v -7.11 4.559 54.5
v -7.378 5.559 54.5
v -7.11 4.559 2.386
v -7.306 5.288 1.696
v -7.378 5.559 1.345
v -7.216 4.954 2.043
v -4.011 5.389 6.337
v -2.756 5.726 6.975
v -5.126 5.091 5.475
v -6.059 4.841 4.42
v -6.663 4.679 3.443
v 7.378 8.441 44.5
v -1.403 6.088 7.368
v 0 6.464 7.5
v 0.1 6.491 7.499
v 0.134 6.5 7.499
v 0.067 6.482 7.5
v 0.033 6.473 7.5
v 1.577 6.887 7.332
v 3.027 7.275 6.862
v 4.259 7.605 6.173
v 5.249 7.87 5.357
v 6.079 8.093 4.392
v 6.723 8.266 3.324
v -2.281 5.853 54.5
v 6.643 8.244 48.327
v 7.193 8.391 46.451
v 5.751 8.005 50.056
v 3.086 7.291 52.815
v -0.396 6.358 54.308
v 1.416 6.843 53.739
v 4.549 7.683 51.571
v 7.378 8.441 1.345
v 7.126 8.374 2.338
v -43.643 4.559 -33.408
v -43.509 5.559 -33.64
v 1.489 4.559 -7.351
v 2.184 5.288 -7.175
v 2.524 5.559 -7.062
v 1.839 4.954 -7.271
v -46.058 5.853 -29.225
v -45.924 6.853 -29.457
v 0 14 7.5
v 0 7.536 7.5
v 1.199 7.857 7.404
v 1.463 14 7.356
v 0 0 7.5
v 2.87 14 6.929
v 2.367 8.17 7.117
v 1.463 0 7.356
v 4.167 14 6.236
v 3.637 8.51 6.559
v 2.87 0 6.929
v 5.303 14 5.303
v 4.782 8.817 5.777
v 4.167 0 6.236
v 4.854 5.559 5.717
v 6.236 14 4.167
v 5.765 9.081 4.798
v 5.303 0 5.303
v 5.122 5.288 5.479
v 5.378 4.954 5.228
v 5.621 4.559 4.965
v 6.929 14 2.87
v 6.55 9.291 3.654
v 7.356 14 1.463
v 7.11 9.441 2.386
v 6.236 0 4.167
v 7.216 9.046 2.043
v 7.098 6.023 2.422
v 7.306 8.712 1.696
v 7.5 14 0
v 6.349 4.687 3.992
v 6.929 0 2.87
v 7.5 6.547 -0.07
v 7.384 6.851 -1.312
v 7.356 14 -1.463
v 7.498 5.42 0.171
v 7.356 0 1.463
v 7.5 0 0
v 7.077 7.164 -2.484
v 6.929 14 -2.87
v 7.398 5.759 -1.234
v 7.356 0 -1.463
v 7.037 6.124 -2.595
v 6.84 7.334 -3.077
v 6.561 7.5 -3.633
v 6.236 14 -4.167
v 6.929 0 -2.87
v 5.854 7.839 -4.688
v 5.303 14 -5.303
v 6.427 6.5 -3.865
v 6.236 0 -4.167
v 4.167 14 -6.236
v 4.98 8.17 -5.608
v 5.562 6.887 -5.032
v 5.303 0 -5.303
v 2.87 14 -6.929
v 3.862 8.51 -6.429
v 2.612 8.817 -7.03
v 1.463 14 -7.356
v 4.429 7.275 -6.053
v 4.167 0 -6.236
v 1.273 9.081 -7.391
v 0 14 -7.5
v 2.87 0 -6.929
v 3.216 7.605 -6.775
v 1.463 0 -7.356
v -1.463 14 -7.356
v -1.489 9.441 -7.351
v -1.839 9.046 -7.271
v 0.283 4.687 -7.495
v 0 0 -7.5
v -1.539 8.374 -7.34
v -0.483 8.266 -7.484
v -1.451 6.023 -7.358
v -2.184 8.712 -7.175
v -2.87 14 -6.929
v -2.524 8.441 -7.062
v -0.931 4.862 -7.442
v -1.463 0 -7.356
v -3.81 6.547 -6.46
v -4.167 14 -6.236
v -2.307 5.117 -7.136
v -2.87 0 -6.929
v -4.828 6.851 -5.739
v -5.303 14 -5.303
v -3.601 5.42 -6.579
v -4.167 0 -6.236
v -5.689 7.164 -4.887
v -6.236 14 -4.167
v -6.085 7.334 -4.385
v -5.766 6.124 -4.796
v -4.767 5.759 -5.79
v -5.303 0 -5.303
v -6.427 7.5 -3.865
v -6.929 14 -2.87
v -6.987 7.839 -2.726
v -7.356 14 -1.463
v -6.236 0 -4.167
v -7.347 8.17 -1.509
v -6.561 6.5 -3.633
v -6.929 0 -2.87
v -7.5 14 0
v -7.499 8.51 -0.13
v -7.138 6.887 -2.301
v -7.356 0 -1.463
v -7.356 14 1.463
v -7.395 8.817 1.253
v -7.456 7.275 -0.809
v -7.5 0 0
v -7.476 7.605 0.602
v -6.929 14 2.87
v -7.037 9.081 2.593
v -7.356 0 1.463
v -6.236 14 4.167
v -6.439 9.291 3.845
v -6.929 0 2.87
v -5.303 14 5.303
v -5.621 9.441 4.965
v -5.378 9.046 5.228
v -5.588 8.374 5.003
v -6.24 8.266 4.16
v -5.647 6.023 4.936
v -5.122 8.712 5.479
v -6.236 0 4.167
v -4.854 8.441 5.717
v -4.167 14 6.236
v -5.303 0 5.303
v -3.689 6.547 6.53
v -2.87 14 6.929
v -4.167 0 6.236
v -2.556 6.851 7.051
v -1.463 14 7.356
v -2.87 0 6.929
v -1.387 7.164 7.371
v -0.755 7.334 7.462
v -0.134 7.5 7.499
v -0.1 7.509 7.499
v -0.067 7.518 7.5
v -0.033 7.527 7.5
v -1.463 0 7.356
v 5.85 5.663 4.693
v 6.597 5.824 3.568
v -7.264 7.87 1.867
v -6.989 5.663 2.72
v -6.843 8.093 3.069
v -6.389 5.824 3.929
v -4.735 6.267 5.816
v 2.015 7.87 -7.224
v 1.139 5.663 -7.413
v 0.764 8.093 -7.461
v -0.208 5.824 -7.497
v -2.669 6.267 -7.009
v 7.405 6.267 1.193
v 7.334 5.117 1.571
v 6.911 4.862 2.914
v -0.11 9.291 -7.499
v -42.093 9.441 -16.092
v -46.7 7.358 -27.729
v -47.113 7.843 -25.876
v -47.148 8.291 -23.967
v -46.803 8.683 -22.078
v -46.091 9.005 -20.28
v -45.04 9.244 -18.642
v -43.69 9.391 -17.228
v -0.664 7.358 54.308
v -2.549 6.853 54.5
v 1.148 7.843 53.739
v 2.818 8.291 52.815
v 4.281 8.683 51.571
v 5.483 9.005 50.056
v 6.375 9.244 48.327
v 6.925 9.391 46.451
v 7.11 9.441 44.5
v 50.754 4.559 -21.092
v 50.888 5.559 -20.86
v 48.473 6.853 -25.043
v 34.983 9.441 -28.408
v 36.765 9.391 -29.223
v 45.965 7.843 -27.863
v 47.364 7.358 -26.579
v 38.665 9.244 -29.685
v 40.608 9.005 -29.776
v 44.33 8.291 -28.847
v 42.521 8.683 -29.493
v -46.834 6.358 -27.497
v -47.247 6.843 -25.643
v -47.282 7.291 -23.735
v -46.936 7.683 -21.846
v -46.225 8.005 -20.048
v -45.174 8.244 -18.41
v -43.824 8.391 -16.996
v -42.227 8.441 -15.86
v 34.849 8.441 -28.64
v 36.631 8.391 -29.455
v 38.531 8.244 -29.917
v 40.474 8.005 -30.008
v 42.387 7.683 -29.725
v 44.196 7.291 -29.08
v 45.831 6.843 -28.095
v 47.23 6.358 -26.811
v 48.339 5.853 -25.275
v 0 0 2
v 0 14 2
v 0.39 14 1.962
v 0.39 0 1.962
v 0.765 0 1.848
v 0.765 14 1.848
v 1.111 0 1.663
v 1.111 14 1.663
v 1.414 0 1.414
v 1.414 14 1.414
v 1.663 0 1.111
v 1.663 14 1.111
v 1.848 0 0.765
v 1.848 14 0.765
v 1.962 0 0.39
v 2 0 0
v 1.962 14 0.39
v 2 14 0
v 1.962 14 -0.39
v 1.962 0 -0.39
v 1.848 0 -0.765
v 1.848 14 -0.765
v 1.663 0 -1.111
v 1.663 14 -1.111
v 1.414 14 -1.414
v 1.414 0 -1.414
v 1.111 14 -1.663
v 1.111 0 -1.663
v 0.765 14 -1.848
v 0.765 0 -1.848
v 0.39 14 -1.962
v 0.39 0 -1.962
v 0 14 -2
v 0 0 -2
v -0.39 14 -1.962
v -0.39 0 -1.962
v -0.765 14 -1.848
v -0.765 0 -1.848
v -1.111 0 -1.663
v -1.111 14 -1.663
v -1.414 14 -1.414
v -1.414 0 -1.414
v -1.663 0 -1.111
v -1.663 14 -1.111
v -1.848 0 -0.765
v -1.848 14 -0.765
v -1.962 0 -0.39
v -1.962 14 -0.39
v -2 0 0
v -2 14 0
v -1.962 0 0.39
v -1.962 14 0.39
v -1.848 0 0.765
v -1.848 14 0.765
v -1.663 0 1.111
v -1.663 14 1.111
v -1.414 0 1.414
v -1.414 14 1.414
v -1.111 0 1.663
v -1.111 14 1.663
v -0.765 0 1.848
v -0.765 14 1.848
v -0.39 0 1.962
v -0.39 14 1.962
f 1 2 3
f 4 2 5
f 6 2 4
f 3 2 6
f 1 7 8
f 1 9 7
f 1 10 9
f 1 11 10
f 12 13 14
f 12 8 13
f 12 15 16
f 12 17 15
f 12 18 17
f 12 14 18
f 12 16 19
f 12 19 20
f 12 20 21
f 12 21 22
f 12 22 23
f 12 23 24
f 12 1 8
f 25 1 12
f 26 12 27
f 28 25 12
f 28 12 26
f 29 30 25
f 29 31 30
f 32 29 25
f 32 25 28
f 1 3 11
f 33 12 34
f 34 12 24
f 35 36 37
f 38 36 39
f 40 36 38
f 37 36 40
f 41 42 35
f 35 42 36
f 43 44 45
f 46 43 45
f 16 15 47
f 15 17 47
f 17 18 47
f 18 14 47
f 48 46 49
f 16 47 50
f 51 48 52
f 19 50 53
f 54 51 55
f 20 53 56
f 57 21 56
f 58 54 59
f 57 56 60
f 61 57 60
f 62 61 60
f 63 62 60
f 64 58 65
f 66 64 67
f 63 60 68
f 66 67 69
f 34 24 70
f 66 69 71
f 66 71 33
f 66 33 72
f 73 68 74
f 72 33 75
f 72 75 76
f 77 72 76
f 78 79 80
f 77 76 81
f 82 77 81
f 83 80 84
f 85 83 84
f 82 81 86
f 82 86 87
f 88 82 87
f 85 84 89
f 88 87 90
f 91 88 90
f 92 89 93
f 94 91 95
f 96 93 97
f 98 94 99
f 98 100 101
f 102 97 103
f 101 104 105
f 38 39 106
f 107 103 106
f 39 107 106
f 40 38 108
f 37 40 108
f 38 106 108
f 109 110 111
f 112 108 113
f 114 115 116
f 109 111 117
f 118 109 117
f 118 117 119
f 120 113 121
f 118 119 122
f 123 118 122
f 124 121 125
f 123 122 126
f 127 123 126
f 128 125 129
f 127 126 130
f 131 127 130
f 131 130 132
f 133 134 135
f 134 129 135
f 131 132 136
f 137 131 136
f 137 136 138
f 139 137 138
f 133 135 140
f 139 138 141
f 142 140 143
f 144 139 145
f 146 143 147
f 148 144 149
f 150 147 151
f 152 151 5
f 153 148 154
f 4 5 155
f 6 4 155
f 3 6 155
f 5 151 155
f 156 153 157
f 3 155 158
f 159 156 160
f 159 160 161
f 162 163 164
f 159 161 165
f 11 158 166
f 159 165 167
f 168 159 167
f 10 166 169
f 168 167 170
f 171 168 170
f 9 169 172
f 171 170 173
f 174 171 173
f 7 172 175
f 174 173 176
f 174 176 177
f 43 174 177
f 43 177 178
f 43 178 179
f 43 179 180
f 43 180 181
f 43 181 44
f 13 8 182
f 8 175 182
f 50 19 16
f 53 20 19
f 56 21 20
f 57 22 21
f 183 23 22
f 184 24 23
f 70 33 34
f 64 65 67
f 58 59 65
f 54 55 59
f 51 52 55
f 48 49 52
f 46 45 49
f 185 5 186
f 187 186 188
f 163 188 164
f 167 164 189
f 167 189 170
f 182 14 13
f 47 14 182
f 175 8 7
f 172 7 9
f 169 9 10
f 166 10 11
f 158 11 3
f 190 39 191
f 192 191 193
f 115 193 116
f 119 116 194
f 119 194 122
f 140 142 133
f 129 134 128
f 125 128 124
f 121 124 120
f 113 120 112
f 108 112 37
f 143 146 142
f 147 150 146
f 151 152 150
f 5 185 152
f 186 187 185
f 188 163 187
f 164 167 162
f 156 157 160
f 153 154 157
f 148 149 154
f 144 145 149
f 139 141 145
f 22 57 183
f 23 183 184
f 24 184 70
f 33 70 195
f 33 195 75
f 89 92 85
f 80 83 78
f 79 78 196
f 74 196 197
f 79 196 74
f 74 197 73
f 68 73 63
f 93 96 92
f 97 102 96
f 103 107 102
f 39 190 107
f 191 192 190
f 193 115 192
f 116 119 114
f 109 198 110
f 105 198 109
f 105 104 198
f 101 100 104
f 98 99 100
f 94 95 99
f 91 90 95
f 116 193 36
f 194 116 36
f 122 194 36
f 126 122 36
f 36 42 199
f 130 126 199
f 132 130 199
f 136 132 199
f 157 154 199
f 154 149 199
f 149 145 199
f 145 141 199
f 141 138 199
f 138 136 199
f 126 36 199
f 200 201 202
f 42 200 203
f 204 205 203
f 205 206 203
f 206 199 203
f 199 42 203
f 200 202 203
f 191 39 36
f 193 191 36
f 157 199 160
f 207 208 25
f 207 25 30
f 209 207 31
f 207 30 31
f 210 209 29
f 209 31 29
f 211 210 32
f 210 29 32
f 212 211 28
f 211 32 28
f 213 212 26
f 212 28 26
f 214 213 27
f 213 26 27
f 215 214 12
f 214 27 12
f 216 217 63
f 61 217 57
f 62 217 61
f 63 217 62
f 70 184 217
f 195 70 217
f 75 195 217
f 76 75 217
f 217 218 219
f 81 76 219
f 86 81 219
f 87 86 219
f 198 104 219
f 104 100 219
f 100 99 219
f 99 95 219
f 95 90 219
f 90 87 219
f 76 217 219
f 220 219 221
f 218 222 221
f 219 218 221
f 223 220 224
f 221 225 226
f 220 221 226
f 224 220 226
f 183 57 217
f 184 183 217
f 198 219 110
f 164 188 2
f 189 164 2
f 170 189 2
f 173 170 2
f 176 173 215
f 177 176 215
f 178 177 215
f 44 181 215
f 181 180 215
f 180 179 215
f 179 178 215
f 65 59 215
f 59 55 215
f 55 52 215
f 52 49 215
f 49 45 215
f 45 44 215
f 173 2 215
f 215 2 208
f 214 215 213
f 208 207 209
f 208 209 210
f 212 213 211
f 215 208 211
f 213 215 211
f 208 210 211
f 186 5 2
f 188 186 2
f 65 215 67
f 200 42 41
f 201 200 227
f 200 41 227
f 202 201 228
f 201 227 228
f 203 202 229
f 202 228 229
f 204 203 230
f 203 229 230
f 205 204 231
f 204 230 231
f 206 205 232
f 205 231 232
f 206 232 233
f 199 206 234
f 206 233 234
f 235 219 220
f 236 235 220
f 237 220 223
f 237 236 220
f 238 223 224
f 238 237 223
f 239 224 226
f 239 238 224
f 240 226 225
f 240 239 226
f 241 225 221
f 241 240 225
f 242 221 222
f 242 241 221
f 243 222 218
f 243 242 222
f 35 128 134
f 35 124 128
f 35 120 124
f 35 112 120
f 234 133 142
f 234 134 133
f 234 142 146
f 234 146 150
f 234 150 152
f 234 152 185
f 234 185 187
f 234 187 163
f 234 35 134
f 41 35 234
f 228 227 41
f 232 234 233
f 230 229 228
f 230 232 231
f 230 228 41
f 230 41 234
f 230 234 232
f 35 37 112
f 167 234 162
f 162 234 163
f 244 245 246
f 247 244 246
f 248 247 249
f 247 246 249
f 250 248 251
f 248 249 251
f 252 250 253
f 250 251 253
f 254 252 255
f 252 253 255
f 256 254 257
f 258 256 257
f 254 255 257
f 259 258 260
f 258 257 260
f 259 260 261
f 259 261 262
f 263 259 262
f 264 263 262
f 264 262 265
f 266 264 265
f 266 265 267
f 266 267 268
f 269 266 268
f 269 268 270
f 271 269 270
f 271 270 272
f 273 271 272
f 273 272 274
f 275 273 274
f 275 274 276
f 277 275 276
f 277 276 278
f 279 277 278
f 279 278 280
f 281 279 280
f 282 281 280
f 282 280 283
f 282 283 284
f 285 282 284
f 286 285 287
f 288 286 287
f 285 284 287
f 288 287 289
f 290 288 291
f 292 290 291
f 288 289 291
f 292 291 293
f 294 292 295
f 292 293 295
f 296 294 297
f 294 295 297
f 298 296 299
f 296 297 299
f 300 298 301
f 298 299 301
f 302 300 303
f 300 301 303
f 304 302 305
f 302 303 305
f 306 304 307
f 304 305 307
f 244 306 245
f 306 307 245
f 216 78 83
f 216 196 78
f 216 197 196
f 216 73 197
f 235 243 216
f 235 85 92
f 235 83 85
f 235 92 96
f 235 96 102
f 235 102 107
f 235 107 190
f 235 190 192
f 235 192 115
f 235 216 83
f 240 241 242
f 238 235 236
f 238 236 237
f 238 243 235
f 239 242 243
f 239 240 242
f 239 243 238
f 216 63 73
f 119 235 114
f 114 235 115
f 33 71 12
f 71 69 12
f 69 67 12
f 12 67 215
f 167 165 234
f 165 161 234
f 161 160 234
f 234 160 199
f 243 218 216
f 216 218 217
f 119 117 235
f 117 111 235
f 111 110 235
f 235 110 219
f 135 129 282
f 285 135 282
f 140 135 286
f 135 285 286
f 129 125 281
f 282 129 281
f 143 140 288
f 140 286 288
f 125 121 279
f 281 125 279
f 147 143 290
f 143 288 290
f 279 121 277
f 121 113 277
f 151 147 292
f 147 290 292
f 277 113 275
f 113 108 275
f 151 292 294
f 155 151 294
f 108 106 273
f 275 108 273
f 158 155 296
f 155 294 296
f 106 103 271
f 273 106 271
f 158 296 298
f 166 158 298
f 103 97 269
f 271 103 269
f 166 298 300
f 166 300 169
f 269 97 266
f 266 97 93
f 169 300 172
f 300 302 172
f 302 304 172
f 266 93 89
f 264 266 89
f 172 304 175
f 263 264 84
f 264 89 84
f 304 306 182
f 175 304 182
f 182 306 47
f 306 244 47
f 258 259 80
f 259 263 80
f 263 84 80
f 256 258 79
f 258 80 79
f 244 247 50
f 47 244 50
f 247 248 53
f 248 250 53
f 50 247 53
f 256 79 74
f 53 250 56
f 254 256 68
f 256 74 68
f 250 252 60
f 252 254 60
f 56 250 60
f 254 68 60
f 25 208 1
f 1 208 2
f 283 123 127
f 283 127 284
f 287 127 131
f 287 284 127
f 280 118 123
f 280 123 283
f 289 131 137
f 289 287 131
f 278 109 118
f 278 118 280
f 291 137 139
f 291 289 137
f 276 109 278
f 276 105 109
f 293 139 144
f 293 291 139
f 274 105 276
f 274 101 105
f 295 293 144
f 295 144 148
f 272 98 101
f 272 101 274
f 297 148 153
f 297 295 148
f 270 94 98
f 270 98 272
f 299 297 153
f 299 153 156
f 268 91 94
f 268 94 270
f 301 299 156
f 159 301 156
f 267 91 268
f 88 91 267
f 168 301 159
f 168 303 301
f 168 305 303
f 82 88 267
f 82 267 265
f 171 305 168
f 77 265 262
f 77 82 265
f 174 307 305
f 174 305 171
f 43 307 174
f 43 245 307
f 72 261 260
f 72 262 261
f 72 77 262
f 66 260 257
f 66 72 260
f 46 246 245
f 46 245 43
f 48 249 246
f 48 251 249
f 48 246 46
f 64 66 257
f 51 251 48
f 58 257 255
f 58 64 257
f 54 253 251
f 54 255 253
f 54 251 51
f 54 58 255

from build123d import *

# Parameters (mm, degrees)
SKETCH1_R                = 7.5
BOSS_EXTRUDE2_DEPTH      = 14
CUT_EXTRUDE1_REACH       = 19.564
SKETCH2_R                = 2
BOSS_EXTRUDE3_START      = -7.279118874
BOSS_EXTRUDE3_DEPTH      = 1.03527618
FILLET1_R                = 10
CIRPATTERN1_COUNT        = 3
FILLET1_OF_CIRPATTERN1_R = 10


with BuildPart() as part:
    # Sketch1 → Boss-Extrude2 (new body)
    with BuildSketch(Plane(origin=(0, 0, 0), x_dir=(1, 0, 0), z_dir=(0, 1, 0))):
        with Locations(Location((0, 0, 0), (0, 0, 270))):
            Circle(SKETCH1_R)
    extrude(amount=BOSS_EXTRUDE2_DEPTH)

    # Sketch2 → Cut-Extrude1 (cut, up to next)
    with BuildSketch(Plane(origin=(0, 14, 0), x_dir=(1, 0, 0), z_dir=(0, 1, 0)), mode=Mode.PRIVATE) as cut_extrude1_sk1:
        with Locations(Location((0, 0, 0), (0, 0, 270))):
            Circle(SKETCH2_R)
    cut_extrude1_tool1 = extrude(cut_extrude1_sk1.sketch, amount=-CUT_EXTRUDE1_REACH, mode=Mode.PRIVATE) & part.part
    add(cut_extrude1_tool1.solids().sort_by_distance((0, 14, 0))[0], mode=Mode.SUBTRACT)

    # Boss-Extrude3: read off the stored shape, not the designer's step
    # Boss-Extrude3 outline → Boss-Extrude3 (add)
    with BuildSketch(Plane(origin=(0, 0, 0), x_dir=(0.9659258262890672, 0.2588190451025251, 0), z_dir=(0.25881904510252507, -0.9659258262890672, 0)).offset(BOSS_EXTRUDE3_START)):
        with BuildLine():
            add(Edge.make_bspline(
                [(-5.688266684, 1.344969698), (-4.547659305, 7.389056985), (1.811733316, 7.498803292)],
                knots=[0.18030465, 0.18030465, 0.18030465, 1.551469461, 1.551469461, 1.551469461], degree=2, weights=[1, 0.771122328, 0.993637519]))
            add(Edge.make_bspline(
                [(1.811733316, 7.498803292), (8.171125936, 7.389056985), (9.311733316, 1.344969698)],
                knots=[1.590123193, 1.590123193, 1.590123193, 2.961288004, 2.961288004, 2.961288004], degree=2, weights=[0.993637519, 0.771122328, 1]))
            Line((9.311733316, 1.344969698), (9.311733316, 54.5))
            Line((9.311733316, 54.5), (-5.688266684, 54.5))
            Line((-5.688266684, 54.5), (-5.688266684, 1.344969698))
        make_face()
    boss_extrude3 = extrude(amount=BOSS_EXTRUDE3_DEPTH)

    # Fillet1
    fillet1_edges = [part.edges().sort_by_distance(p)[0] for p in [
        (7.244443697, 8.941142838, 54.5),
    ]]
    fillet(fillet1_edges, radius=FILLET1_R)

    # CirPattern1: Boss-Extrude3 ×3 about axis
    cirpattern1_axis = Axis((0, 0, 0), (0, 1, 0))
    for i in range(1, CIRPATTERN1_COUNT):
        add(boss_extrude3.rotate(cirpattern1_axis, i * 360 / CIRPATTERN1_COUNT))

    # Fillet1 of CirPattern1
    fillet1_of_cirpattern1_edges = [part.edges().sort_by_distance(p)[0] for p in [
        (43.576162658, 8.941142838, -33.523872278),
        (-50.820606355, 8.941142838, -20.976127722),
    ]]
    fillet(fillet1_of_cirpattern1_edges, radius=FILLET1_OF_CIRPATTERN1_R)


solid = part.part
